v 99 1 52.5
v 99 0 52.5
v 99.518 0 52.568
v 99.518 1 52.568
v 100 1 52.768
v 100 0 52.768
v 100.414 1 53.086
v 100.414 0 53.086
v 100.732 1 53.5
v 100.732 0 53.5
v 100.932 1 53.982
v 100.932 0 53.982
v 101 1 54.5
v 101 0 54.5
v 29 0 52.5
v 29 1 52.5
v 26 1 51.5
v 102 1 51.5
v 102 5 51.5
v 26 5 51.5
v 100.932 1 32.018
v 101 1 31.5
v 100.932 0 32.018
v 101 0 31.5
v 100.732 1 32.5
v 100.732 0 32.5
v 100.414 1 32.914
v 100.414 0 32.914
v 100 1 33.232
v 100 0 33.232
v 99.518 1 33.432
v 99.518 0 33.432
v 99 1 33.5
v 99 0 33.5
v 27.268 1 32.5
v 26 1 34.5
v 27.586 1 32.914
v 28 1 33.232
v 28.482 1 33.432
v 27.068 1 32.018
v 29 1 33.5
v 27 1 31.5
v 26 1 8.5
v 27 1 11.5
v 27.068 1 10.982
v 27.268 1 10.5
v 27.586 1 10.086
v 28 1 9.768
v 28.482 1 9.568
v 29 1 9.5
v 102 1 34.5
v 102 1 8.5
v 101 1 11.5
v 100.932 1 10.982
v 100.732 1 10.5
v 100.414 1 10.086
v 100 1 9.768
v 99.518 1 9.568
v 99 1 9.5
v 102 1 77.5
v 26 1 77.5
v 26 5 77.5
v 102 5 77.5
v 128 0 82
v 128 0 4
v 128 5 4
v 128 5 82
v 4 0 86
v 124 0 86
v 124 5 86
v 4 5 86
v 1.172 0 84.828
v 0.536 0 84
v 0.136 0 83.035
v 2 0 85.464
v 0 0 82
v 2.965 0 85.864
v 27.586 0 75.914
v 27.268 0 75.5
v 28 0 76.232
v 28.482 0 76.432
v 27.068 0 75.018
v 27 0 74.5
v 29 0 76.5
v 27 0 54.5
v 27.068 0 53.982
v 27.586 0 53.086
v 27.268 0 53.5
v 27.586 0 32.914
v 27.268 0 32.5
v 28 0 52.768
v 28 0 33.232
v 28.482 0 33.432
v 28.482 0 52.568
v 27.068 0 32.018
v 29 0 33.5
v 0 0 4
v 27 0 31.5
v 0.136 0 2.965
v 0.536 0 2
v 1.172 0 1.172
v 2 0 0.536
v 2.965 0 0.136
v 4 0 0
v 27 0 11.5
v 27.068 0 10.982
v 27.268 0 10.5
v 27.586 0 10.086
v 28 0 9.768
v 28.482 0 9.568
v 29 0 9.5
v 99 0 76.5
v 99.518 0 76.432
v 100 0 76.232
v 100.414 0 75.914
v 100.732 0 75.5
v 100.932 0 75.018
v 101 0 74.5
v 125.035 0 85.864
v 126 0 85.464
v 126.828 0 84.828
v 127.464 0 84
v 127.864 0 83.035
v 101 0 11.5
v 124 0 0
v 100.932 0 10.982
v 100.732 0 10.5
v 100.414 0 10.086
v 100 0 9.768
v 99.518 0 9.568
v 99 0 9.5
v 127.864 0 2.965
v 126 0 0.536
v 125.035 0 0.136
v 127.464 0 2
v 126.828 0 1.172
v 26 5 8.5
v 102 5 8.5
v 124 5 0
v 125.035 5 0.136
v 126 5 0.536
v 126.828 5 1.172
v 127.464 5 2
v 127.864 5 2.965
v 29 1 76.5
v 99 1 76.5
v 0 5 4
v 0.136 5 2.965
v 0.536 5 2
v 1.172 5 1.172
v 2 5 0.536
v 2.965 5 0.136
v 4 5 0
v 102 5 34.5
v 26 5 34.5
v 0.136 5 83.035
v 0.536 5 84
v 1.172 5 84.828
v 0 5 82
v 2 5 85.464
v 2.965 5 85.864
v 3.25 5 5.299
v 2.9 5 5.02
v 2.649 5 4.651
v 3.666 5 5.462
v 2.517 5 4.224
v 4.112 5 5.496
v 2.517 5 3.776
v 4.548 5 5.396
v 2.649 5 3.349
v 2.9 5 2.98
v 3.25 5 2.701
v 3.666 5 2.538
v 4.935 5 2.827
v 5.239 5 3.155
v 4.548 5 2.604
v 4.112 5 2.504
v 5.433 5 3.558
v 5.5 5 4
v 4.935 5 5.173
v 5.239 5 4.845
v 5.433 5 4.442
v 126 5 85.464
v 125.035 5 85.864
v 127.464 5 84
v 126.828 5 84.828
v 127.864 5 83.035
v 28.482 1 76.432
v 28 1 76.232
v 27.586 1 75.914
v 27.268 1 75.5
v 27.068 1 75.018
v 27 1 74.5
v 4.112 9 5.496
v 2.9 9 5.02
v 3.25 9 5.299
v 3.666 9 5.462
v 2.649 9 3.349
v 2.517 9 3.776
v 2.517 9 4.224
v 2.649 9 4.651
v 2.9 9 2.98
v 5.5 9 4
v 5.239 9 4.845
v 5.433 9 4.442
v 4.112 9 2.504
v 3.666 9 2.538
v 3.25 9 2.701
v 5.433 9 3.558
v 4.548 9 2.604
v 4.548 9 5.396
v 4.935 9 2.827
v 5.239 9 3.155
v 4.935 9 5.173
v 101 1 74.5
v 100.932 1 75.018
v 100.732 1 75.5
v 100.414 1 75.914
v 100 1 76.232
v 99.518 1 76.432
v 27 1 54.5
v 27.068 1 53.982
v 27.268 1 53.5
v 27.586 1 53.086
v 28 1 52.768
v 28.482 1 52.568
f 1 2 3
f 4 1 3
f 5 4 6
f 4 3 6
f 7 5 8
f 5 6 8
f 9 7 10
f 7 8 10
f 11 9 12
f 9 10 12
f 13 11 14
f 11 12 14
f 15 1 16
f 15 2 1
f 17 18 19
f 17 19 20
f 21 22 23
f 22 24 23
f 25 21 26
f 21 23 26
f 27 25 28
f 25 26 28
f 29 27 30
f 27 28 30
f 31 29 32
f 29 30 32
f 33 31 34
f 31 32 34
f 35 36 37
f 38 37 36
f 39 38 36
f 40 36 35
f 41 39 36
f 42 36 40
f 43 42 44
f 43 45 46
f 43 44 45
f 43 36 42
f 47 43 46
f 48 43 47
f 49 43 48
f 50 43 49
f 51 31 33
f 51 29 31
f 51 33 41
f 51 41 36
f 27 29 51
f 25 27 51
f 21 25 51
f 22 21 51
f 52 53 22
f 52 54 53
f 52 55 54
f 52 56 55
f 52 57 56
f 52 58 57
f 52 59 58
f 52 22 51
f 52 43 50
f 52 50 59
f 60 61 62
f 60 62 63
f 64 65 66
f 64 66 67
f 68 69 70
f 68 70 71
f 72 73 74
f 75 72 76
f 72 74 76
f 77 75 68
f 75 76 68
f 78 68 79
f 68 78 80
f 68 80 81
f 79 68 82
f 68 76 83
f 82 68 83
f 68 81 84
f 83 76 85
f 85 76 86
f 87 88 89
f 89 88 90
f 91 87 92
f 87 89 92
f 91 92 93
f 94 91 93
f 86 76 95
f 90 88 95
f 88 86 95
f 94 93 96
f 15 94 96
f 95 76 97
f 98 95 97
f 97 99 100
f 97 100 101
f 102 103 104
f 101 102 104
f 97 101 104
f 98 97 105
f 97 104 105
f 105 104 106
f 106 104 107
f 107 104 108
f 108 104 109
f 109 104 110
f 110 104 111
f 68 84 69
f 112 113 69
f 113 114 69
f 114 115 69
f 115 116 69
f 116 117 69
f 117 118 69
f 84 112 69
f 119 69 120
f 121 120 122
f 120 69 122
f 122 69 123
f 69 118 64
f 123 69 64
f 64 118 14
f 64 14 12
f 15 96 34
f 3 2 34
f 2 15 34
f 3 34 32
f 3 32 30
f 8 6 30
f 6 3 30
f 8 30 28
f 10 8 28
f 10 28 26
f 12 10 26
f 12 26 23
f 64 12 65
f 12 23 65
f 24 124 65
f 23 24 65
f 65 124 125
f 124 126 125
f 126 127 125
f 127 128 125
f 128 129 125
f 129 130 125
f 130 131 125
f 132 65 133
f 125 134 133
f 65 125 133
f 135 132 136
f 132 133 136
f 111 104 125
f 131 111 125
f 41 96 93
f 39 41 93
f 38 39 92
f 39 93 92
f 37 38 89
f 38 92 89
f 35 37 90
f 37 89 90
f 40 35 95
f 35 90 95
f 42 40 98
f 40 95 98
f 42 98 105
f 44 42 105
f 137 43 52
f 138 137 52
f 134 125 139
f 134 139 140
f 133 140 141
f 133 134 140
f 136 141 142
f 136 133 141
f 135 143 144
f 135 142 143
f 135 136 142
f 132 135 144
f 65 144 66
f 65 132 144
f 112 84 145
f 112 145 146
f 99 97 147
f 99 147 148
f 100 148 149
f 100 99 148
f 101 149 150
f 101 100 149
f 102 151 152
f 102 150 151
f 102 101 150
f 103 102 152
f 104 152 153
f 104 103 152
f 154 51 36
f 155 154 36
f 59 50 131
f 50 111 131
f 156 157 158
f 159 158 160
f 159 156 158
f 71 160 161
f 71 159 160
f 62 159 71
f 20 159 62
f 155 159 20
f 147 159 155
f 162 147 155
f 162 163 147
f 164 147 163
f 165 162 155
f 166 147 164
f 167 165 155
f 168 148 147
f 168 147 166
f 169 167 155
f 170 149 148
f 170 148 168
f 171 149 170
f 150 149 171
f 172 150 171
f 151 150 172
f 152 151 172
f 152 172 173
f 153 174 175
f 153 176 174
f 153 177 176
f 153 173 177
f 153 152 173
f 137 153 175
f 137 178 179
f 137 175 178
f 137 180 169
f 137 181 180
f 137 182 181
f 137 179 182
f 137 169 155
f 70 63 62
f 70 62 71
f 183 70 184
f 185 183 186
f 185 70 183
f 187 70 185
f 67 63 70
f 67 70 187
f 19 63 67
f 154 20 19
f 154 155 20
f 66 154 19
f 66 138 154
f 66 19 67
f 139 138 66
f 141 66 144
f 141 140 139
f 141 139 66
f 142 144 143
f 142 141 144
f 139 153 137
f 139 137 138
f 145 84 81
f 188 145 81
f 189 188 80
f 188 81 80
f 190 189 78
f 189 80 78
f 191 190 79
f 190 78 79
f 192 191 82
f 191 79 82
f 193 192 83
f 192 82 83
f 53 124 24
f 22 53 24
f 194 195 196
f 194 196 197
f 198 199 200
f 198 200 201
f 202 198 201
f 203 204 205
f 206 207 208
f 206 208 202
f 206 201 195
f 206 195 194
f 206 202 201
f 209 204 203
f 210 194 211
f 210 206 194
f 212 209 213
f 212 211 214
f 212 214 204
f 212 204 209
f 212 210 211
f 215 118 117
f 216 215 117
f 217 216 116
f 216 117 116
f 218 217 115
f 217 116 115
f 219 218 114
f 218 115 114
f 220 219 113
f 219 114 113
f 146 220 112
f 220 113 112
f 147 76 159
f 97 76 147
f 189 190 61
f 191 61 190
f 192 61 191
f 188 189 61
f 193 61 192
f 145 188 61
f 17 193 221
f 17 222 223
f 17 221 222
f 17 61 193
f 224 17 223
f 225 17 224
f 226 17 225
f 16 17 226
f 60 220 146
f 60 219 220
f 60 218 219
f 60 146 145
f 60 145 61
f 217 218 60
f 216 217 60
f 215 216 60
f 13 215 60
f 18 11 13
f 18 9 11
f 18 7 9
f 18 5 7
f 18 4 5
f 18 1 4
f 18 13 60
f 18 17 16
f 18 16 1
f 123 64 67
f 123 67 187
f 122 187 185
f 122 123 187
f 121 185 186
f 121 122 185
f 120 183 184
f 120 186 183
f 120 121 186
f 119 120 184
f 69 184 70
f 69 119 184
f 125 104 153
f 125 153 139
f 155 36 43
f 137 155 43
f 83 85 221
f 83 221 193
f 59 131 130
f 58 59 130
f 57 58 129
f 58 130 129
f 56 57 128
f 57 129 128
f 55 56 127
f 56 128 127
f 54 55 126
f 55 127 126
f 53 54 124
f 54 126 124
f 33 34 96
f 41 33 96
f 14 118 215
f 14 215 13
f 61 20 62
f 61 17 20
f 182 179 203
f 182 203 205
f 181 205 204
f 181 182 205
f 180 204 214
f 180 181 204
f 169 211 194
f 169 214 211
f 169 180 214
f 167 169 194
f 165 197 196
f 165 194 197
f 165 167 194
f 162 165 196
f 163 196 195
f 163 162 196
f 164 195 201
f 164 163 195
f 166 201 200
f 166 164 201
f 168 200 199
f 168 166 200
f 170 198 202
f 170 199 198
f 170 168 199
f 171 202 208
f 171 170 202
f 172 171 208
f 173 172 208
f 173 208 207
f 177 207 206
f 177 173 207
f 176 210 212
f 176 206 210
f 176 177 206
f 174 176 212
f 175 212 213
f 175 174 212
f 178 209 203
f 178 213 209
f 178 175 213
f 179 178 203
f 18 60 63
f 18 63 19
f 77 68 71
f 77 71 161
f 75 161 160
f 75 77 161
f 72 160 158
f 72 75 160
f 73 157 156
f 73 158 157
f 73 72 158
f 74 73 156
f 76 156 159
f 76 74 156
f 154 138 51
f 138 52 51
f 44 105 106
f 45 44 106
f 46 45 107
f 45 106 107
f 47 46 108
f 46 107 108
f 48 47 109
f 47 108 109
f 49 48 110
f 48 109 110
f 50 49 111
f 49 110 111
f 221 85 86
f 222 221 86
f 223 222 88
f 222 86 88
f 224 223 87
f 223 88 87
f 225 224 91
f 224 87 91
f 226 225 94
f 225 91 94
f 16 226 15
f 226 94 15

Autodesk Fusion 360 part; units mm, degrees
sketch "Sketch1" plane through (0, 0, 0) normal (0, 1, 0) x (1, 0, 0)
  line L0 (5, -15) -> (56.3866, -15)
  line L1 (56.3866, -15) -> (56.3866, -37.4714)
  line L2 (56.3866, -37.4714) -> (5, -37.4714)
  line L3 (5, -37.4714) -> (5, -15)
sketch "Sketch2" plane through (0, 0, 0) normal (0, 1, 0) x (1, 0, 0)
  line L0 (4, 0) -> (124, 0)
  line L1 (128, -4) -> (128, -82)
  line L2 (124, -86) -> (4, -86)
  line L3 (0, -82) -> (0, -4)
  arc A0 (4, 0) -> (0, -4) centre (4, -4) ccw
  arc A1 (128, -4) -> (124, 0) centre (124, -4) ccw
  arc A2 (0, -82) -> (4, -86) centre (4, -82) ccw
  arc A3 (124, -86) -> (128, -82) centre (124, -82) ccw
  line L4 (64, -86) -> (64, 0) construction
  line L5 (64, -43) -> (64, -21.5) construction
  line L6 (64, -21.5) -> (64, -8.5) construction
  line L7 (64, -8.5) -> (26, -8.5) construction
  line L8 (26, -8.5) -> (102, -8.5)
  line L9 (102, -8.5) -> (102, -34.5)
  line L10 (102, -34.5) -> (26, -34.5)
  line L11 (26, -34.5) -> (26, -8.5)
  line L12 (26, -8.5) -> (27, -8.5) construction
  line L13 (27, -8.5) -> (27, -9.5) construction
  line L14 (29, -9.5) -> (99, -9.5)
  line L15 (101, -11.5) -> (101, -31.5)
  line L16 (99, -33.5) -> (29, -33.5)
  line L17 (27, -31.5) -> (27, -11.5)
  line L18 (64, -64.5) -> (64, -77.5) construction
  line L19 (64, -77.5) -> (26, -77.5) construction
  line L20 (26, -77.5) -> (102, -77.5)
  line L21 (102, -77.5) -> (102, -51.5)
  line L22 (102, -51.5) -> (26, -51.5)
  line L23 (26, -51.5) -> (26, -77.5)
  line L24 (26, -77.5) -> (26, -76.5)
  line L25 (26, -76.5) -> (27, -76.5)
  line L26 (29, -76.5) -> (99, -76.5)
  line L27 (101, -74.5) -> (101, -54.5)
  line L28 (99, -52.5) -> (29, -52.5)
  line L29 (27, -54.5) -> (27, -74.5)
  arc A4 (29, -52.5) -> (27, -54.5) centre (29, -54.5) ccw
  arc A5 (27, -74.5) -> (29, -76.5) centre (29, -74.5) ccw
  arc A6 (101, -54.5) -> (99, -52.5) centre (99, -54.5) ccw
  arc A7 (99, -76.5) -> (101, -74.5) centre (99, -74.5) ccw
  arc A8 (29, -9.5) -> (27, -11.5) centre (29, -11.5) ccw
  arc A9 (27, -31.5) -> (29, -33.5) centre (29, -31.5) ccw
  arc A10 (99, -33.5) -> (101, -31.5) centre (99, -31.5) ccw
  arc A11 (101, -11.5) -> (99, -9.5) centre (99, -11.5) ccw
  circle A12 centre (4, -4) radius 1.5
  point P0 (128, 0)
  point P1 (0, -86)
  point P2 (101, -9.5)
  point P3 (27, -33.5)
  point P4 (101, -76.5)
  point P5 (27, -52.5)
  dimension "d3" = 128
  dimension "d4" = 86
  dimension "d5" = 4
  dimension "d6" = 4
  dimension "d7" = 4
  dimension "d8" = 4
  dimension "d12" = 76
  dimension "d13" = 26
  dimension "d14" = 1
  dimension "d15" = 74
  dimension "d16" = 24
  dimension "d20" = 76
  dimension "d21" = 26
  dimension "d22" = 74
  dimension "d23" = 24
  dimension "d24" = 2
  dimension "d25" = 2
  dimension "d26" = 2
  dimension "d27" = 2
  dimension "d28" = 2
  dimension "d29" = 2
  dimension "d30" = 2
  dimension "d31" = 2
  dimension "d32" = 3
extrude "Extrude2" add sketch "Sketch2" along normal blind 5 contours L0 L1 L2 L3 A0 A1 A2 A3
extrude "Extrude3" add sketch "Sketch2" along normal blind 0.5 contours L8 L9 L10 L11
extrude "Extrude4" add 1 faces at (52.3333, 0.5, 34.1667) along direction (0, 1, 0) blind 0.5
extrude "Extrude5" add sketch "Sketch2" along normal blind 1 contours L20 L21 L22 L23 L24
extrude "Extrude6" add sketch "Sketch2" along normal blind 12 contours A12
extrude "Extrude7" cut 1 faces at (3.584, 12, 3.3234) along direction (0, -1, 0) blind 5
extrude "Extrude8" add 1 faces at (3.584, 7, 3.3234) along direction (0, 1, 0) blind 2
